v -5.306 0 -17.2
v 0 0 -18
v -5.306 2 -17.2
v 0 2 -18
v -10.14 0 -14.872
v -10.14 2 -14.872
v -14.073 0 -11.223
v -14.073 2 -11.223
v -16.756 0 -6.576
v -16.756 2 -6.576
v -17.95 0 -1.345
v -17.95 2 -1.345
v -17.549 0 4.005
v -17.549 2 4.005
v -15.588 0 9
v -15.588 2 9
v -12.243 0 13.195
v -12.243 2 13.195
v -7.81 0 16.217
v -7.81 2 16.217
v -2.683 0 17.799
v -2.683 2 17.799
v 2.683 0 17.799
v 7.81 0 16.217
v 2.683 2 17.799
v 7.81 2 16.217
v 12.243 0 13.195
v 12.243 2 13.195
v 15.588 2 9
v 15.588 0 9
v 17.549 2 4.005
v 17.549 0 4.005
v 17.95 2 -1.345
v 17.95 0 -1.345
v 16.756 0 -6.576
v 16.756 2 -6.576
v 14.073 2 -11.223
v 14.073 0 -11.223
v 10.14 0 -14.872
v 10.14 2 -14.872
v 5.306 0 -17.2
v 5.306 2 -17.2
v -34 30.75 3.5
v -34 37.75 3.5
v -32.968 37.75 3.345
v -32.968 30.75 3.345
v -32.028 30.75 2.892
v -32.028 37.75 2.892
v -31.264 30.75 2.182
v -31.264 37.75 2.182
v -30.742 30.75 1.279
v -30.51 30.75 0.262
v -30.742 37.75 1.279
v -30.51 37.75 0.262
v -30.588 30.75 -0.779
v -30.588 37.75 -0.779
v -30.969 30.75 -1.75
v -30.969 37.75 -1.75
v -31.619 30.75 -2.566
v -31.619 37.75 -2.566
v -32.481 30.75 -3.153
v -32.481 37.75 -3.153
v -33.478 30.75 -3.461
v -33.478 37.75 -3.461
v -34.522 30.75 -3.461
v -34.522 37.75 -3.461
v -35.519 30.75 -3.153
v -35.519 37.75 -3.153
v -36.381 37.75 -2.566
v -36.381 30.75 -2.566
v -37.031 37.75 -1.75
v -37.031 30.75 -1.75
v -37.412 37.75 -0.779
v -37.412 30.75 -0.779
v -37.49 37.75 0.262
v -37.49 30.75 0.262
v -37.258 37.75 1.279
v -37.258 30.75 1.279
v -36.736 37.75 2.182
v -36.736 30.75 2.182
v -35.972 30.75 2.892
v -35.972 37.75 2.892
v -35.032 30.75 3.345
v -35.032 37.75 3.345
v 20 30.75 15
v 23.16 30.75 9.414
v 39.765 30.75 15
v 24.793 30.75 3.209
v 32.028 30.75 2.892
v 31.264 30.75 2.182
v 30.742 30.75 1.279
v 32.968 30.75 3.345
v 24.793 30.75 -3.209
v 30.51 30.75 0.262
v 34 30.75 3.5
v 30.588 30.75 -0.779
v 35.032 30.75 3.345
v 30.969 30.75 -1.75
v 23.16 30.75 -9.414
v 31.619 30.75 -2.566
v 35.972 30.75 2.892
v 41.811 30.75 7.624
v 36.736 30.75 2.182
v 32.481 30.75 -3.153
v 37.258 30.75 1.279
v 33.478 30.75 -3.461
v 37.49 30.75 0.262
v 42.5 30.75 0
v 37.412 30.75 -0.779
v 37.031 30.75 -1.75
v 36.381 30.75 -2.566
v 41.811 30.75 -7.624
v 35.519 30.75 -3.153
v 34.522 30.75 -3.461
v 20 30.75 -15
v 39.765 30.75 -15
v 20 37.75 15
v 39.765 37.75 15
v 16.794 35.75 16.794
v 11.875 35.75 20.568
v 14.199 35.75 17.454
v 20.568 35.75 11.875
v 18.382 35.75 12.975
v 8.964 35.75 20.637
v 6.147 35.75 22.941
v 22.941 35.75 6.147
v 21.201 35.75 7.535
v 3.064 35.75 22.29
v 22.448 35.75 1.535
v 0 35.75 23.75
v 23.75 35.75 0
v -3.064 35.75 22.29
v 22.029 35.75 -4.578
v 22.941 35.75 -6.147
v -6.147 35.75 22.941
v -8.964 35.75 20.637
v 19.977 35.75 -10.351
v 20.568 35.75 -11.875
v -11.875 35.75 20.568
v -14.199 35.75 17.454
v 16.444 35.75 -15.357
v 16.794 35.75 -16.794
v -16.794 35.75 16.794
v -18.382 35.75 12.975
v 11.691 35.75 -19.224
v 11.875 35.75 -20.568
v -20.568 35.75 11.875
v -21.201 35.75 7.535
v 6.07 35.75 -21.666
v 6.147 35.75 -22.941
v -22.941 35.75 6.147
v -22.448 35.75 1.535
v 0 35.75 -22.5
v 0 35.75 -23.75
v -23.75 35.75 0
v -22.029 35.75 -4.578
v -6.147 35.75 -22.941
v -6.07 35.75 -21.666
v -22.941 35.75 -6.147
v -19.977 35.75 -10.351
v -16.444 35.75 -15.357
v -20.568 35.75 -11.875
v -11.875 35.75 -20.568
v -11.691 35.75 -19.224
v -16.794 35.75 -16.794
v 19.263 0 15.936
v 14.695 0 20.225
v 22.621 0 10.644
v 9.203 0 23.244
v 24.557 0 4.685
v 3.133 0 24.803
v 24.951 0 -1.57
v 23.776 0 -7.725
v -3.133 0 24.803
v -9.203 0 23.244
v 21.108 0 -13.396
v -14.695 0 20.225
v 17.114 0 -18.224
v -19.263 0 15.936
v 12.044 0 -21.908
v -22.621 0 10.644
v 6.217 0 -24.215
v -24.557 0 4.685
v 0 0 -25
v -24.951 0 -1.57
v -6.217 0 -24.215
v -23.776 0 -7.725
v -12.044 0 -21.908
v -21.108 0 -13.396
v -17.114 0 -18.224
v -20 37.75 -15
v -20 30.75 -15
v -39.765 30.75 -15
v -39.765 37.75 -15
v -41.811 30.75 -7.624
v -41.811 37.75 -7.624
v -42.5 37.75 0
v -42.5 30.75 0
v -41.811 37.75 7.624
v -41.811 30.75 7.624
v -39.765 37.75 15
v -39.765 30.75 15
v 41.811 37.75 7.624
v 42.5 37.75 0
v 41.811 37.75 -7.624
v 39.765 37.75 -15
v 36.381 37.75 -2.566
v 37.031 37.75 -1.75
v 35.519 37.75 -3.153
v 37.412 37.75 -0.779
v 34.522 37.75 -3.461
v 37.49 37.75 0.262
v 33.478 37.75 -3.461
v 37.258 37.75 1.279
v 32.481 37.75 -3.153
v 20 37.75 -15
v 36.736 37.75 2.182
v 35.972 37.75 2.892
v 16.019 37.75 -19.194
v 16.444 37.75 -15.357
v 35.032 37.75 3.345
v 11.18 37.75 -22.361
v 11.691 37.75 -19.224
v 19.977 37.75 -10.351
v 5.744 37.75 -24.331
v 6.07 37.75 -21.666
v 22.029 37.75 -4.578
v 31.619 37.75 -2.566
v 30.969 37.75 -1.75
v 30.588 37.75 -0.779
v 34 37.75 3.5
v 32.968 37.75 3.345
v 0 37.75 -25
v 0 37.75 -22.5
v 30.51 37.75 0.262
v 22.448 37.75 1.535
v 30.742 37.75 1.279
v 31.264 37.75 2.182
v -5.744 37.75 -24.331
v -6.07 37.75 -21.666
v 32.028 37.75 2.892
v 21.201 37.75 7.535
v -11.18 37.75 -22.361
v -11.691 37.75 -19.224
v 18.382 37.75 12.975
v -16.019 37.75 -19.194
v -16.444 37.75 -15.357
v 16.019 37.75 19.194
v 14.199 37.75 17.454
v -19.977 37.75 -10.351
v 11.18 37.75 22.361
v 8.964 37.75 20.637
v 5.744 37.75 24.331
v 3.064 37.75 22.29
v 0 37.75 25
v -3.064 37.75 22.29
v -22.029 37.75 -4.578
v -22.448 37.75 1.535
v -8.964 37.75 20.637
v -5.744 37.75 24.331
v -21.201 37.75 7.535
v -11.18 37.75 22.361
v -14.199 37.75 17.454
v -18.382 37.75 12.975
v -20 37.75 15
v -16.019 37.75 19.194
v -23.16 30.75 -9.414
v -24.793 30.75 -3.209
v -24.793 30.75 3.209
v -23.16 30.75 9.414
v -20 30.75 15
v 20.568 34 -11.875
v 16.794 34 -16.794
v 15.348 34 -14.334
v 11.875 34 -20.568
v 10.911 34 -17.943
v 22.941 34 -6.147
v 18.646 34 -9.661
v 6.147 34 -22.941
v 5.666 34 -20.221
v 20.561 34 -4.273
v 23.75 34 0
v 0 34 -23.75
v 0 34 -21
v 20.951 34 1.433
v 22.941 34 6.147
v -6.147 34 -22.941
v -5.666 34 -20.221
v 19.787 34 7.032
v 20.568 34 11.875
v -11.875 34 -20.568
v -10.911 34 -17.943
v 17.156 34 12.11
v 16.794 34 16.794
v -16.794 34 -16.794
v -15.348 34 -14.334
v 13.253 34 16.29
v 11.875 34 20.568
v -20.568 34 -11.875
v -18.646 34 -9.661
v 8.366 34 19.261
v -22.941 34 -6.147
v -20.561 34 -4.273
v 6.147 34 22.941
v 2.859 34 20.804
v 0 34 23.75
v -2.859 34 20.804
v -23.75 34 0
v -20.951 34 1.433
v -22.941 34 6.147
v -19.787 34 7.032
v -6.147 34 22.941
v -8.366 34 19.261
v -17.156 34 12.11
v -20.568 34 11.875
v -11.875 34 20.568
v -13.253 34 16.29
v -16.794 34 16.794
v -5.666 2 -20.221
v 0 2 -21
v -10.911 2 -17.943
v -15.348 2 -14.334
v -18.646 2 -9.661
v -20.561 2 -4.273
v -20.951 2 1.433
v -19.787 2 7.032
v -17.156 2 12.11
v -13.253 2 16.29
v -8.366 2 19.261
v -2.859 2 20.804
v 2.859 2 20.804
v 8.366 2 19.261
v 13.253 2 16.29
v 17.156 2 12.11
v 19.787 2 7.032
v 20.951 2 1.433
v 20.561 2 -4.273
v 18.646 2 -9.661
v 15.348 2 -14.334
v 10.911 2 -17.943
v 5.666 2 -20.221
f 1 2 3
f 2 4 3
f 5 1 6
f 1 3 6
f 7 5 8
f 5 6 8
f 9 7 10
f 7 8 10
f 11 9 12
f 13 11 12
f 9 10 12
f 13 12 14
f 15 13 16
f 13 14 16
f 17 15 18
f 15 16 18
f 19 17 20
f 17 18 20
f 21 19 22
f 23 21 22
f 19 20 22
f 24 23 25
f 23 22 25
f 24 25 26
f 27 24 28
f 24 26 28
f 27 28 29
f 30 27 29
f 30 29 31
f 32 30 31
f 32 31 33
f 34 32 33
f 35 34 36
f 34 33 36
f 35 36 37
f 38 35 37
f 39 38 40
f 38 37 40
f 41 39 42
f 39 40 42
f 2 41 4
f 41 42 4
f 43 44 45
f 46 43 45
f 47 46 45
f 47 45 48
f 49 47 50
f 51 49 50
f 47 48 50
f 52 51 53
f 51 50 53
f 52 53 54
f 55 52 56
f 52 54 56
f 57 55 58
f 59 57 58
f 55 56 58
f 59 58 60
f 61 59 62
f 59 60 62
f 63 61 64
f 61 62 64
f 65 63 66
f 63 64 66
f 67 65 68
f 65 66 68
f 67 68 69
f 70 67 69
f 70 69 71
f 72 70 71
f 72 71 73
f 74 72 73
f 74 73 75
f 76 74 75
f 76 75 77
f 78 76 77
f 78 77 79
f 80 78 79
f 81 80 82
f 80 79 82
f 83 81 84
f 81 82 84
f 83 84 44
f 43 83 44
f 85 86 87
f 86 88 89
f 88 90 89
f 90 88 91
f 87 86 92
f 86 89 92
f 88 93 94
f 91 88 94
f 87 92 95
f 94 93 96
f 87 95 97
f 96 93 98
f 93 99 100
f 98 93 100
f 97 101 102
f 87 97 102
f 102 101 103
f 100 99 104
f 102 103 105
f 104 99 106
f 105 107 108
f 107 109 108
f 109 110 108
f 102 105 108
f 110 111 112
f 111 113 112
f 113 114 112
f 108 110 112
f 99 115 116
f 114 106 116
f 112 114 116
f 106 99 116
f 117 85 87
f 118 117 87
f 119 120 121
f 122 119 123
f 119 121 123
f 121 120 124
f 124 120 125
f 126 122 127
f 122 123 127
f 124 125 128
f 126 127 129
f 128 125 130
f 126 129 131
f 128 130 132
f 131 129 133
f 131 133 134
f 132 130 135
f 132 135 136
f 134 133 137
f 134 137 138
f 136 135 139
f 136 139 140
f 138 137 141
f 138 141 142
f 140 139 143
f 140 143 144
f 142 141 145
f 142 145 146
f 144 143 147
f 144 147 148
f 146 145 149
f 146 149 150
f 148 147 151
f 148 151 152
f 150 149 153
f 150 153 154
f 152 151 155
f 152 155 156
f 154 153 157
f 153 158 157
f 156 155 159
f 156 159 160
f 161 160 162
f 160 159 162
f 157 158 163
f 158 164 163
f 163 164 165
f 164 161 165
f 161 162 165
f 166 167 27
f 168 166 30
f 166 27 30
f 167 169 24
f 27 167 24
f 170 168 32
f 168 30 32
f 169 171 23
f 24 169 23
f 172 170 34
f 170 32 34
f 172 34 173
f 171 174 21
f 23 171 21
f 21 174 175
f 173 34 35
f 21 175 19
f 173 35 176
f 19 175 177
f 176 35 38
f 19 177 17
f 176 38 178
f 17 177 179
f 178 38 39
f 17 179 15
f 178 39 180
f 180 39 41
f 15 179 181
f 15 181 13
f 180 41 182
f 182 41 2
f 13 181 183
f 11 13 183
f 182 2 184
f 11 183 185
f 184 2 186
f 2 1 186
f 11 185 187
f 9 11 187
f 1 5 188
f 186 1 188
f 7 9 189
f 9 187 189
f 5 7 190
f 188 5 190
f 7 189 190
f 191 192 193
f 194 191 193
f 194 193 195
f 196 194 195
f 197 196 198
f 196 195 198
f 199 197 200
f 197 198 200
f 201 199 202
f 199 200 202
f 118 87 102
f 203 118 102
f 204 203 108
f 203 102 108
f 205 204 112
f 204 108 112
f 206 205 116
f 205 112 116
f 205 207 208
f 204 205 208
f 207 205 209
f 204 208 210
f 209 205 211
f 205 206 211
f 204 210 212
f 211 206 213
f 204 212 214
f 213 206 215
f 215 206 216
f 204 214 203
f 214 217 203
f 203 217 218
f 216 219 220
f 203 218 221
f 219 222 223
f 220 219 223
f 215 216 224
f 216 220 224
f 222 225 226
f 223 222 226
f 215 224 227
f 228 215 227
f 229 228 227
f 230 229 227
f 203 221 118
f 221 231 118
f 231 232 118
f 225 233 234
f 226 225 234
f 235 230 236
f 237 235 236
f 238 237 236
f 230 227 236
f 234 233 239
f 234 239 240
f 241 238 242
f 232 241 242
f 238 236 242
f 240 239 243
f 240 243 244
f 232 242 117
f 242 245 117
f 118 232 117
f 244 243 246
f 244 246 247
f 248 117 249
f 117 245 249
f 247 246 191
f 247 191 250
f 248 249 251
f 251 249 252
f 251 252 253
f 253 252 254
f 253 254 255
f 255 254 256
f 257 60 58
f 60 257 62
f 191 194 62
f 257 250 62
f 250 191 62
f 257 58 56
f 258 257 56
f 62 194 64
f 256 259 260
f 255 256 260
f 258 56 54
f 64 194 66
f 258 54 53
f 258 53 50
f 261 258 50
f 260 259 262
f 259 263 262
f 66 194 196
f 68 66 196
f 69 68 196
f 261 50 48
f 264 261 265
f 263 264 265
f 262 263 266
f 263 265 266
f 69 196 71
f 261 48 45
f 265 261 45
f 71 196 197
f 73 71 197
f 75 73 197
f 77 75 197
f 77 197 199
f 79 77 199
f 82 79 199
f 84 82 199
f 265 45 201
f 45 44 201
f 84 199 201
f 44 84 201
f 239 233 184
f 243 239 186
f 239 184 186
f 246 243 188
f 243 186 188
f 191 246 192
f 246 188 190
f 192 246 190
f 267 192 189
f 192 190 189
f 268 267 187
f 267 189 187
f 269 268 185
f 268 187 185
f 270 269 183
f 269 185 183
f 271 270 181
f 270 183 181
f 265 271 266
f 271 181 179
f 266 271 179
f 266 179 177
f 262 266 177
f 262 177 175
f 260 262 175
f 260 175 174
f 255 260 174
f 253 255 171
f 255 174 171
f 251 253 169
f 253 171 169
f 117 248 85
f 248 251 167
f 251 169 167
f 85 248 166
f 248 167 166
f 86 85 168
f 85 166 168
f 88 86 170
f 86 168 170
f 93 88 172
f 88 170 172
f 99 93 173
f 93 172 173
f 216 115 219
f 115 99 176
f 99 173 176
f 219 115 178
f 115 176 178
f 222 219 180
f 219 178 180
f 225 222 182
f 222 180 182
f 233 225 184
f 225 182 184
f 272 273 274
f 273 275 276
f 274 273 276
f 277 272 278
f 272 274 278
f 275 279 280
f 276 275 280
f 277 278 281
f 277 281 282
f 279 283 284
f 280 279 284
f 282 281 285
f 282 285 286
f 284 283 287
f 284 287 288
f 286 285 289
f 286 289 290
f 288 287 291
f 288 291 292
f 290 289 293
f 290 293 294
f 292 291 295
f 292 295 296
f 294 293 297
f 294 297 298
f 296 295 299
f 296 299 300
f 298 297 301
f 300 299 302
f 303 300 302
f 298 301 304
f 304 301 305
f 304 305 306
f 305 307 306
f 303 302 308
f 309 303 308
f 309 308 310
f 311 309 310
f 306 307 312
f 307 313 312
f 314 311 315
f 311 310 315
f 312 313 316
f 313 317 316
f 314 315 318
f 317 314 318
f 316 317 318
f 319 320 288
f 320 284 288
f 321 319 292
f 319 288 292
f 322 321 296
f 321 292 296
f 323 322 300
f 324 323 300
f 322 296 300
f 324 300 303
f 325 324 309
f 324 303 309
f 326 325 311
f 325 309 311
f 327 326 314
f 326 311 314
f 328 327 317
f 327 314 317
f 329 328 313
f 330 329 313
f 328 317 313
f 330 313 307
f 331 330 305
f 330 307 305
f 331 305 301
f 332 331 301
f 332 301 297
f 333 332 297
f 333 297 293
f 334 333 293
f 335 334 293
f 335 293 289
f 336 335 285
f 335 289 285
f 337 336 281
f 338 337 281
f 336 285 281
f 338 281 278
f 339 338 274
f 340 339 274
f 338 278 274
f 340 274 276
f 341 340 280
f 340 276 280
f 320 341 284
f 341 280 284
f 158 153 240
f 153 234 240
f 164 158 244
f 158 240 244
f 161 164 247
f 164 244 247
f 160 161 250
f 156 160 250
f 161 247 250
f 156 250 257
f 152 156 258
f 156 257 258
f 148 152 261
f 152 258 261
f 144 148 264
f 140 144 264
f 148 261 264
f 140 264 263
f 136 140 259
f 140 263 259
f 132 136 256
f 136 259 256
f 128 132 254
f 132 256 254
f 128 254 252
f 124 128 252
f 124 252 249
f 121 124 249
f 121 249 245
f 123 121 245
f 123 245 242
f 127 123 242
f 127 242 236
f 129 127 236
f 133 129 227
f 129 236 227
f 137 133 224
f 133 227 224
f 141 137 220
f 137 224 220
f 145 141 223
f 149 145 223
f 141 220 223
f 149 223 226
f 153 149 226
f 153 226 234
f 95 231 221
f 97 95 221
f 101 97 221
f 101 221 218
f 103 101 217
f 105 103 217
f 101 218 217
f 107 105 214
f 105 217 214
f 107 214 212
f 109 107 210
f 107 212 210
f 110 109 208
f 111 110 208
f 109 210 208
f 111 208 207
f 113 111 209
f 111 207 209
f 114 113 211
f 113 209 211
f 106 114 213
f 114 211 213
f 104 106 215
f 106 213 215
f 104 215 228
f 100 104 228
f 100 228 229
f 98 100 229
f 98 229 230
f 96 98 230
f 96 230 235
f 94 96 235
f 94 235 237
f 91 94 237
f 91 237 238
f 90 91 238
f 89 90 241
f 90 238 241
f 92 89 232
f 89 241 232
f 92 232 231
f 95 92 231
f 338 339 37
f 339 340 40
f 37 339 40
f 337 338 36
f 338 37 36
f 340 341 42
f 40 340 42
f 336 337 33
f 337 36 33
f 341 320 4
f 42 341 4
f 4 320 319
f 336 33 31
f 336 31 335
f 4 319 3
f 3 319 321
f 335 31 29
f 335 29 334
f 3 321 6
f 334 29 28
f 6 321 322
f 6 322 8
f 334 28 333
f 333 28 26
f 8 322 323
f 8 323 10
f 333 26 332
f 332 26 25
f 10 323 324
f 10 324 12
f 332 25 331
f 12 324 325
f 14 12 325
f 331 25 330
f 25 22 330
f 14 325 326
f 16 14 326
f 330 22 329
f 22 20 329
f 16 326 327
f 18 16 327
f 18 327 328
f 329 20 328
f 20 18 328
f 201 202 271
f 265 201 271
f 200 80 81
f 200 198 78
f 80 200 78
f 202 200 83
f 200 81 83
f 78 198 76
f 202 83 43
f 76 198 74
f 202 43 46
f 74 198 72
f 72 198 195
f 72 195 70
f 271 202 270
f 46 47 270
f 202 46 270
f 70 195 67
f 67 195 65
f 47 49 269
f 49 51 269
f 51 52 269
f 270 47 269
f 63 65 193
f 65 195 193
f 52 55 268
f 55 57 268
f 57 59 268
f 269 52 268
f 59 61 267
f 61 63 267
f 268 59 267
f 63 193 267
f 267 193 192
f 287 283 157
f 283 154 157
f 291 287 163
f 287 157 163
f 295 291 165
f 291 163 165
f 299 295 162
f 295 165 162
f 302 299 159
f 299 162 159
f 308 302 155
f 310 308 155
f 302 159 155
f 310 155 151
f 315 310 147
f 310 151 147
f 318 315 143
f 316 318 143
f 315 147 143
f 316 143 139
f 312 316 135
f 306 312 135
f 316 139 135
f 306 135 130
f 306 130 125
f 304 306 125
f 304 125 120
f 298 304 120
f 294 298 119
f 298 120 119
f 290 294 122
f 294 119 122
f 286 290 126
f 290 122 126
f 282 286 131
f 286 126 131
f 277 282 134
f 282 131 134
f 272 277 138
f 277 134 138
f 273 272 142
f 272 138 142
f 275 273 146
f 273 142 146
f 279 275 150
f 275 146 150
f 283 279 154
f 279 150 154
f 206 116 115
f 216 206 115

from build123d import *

# Parameters (mm, degrees)
BOSS_EXTRUDE2_START = -7
BOSS_EXTRUDE2_DEPTH = 7
SKETCH8_R           = 3.5
CUT_EXTRUDE2_DEPTH  = 7


with BuildPart() as part:
    # Sketch4 → Revolve1 (revolve)
    with BuildSketch(Plane(origin=(0, 0, 0), x_dir=(0, 0, -1), z_dir=(1, 0, 0)), mode=Mode.PRIVATE) as revolve1_sk:
        Polygon((-25, 37.75), (-25, 0), (-18, 0), (-18, 2), (-21, 2), (-21, 34), (-23.75, 34), (-23.75, 35.75), (-22.5, 35.75), (-22.5, 37.75), align=None)
    revolve(revolve1_sk.sketch.rotate(Axis((0, -1.117924861, 0), (0, 1, 0)), 180), axis=Axis((0, -1.117924861, 0), (0, 1, 0)))

    # Sketch7 → Boss-Extrude2 (add)
    with BuildSketch(Plane(origin=(0, 37.75, 0), x_dir=(1, 0, 0), z_dir=(0, 1, 0)).offset(BOSS_EXTRUDE2_START)):
        with BuildLine():
            Line((-39.764934301, -15), (-20, -15))
            ThreePointArc((-20, -15), (-25, 0), (-20, 15))
            Line((-20, 15), (-39.764934301, 15))
            ThreePointArc((-39.764934301, 15), (-42.5, 0), (-39.764934301, -15))
        make_face()
        with BuildLine():
            Line((39.764934301, 15), (20, 15))
            ThreePointArc((20, 15), (25, 0), (20, -15))
            Line((20, -15), (39.764934301, -15))
            ThreePointArc((39.764934301, -15), (42.5, 0), (39.764934301, 15))
        make_face()
    extrude(amount=BOSS_EXTRUDE2_DEPTH)

    # Sketch8 → Cut-Extrude2 (cut)
    with BuildSketch(Plane(origin=(0, 37.75, 0), x_dir=(1, 0, 0), z_dir=(0, 1, 0))):
        with Locations(Location((34, 0, 0), (0, 0, 270))):
            Circle(SKETCH8_R)
        with Locations(Location((-34, 0, 0), (0, 0, 270))):
            Circle(SKETCH8_R)
    extrude(amount=-CUT_EXTRUDE2_DEPTH, mode=Mode.SUBTRACT)


solid = part.part
